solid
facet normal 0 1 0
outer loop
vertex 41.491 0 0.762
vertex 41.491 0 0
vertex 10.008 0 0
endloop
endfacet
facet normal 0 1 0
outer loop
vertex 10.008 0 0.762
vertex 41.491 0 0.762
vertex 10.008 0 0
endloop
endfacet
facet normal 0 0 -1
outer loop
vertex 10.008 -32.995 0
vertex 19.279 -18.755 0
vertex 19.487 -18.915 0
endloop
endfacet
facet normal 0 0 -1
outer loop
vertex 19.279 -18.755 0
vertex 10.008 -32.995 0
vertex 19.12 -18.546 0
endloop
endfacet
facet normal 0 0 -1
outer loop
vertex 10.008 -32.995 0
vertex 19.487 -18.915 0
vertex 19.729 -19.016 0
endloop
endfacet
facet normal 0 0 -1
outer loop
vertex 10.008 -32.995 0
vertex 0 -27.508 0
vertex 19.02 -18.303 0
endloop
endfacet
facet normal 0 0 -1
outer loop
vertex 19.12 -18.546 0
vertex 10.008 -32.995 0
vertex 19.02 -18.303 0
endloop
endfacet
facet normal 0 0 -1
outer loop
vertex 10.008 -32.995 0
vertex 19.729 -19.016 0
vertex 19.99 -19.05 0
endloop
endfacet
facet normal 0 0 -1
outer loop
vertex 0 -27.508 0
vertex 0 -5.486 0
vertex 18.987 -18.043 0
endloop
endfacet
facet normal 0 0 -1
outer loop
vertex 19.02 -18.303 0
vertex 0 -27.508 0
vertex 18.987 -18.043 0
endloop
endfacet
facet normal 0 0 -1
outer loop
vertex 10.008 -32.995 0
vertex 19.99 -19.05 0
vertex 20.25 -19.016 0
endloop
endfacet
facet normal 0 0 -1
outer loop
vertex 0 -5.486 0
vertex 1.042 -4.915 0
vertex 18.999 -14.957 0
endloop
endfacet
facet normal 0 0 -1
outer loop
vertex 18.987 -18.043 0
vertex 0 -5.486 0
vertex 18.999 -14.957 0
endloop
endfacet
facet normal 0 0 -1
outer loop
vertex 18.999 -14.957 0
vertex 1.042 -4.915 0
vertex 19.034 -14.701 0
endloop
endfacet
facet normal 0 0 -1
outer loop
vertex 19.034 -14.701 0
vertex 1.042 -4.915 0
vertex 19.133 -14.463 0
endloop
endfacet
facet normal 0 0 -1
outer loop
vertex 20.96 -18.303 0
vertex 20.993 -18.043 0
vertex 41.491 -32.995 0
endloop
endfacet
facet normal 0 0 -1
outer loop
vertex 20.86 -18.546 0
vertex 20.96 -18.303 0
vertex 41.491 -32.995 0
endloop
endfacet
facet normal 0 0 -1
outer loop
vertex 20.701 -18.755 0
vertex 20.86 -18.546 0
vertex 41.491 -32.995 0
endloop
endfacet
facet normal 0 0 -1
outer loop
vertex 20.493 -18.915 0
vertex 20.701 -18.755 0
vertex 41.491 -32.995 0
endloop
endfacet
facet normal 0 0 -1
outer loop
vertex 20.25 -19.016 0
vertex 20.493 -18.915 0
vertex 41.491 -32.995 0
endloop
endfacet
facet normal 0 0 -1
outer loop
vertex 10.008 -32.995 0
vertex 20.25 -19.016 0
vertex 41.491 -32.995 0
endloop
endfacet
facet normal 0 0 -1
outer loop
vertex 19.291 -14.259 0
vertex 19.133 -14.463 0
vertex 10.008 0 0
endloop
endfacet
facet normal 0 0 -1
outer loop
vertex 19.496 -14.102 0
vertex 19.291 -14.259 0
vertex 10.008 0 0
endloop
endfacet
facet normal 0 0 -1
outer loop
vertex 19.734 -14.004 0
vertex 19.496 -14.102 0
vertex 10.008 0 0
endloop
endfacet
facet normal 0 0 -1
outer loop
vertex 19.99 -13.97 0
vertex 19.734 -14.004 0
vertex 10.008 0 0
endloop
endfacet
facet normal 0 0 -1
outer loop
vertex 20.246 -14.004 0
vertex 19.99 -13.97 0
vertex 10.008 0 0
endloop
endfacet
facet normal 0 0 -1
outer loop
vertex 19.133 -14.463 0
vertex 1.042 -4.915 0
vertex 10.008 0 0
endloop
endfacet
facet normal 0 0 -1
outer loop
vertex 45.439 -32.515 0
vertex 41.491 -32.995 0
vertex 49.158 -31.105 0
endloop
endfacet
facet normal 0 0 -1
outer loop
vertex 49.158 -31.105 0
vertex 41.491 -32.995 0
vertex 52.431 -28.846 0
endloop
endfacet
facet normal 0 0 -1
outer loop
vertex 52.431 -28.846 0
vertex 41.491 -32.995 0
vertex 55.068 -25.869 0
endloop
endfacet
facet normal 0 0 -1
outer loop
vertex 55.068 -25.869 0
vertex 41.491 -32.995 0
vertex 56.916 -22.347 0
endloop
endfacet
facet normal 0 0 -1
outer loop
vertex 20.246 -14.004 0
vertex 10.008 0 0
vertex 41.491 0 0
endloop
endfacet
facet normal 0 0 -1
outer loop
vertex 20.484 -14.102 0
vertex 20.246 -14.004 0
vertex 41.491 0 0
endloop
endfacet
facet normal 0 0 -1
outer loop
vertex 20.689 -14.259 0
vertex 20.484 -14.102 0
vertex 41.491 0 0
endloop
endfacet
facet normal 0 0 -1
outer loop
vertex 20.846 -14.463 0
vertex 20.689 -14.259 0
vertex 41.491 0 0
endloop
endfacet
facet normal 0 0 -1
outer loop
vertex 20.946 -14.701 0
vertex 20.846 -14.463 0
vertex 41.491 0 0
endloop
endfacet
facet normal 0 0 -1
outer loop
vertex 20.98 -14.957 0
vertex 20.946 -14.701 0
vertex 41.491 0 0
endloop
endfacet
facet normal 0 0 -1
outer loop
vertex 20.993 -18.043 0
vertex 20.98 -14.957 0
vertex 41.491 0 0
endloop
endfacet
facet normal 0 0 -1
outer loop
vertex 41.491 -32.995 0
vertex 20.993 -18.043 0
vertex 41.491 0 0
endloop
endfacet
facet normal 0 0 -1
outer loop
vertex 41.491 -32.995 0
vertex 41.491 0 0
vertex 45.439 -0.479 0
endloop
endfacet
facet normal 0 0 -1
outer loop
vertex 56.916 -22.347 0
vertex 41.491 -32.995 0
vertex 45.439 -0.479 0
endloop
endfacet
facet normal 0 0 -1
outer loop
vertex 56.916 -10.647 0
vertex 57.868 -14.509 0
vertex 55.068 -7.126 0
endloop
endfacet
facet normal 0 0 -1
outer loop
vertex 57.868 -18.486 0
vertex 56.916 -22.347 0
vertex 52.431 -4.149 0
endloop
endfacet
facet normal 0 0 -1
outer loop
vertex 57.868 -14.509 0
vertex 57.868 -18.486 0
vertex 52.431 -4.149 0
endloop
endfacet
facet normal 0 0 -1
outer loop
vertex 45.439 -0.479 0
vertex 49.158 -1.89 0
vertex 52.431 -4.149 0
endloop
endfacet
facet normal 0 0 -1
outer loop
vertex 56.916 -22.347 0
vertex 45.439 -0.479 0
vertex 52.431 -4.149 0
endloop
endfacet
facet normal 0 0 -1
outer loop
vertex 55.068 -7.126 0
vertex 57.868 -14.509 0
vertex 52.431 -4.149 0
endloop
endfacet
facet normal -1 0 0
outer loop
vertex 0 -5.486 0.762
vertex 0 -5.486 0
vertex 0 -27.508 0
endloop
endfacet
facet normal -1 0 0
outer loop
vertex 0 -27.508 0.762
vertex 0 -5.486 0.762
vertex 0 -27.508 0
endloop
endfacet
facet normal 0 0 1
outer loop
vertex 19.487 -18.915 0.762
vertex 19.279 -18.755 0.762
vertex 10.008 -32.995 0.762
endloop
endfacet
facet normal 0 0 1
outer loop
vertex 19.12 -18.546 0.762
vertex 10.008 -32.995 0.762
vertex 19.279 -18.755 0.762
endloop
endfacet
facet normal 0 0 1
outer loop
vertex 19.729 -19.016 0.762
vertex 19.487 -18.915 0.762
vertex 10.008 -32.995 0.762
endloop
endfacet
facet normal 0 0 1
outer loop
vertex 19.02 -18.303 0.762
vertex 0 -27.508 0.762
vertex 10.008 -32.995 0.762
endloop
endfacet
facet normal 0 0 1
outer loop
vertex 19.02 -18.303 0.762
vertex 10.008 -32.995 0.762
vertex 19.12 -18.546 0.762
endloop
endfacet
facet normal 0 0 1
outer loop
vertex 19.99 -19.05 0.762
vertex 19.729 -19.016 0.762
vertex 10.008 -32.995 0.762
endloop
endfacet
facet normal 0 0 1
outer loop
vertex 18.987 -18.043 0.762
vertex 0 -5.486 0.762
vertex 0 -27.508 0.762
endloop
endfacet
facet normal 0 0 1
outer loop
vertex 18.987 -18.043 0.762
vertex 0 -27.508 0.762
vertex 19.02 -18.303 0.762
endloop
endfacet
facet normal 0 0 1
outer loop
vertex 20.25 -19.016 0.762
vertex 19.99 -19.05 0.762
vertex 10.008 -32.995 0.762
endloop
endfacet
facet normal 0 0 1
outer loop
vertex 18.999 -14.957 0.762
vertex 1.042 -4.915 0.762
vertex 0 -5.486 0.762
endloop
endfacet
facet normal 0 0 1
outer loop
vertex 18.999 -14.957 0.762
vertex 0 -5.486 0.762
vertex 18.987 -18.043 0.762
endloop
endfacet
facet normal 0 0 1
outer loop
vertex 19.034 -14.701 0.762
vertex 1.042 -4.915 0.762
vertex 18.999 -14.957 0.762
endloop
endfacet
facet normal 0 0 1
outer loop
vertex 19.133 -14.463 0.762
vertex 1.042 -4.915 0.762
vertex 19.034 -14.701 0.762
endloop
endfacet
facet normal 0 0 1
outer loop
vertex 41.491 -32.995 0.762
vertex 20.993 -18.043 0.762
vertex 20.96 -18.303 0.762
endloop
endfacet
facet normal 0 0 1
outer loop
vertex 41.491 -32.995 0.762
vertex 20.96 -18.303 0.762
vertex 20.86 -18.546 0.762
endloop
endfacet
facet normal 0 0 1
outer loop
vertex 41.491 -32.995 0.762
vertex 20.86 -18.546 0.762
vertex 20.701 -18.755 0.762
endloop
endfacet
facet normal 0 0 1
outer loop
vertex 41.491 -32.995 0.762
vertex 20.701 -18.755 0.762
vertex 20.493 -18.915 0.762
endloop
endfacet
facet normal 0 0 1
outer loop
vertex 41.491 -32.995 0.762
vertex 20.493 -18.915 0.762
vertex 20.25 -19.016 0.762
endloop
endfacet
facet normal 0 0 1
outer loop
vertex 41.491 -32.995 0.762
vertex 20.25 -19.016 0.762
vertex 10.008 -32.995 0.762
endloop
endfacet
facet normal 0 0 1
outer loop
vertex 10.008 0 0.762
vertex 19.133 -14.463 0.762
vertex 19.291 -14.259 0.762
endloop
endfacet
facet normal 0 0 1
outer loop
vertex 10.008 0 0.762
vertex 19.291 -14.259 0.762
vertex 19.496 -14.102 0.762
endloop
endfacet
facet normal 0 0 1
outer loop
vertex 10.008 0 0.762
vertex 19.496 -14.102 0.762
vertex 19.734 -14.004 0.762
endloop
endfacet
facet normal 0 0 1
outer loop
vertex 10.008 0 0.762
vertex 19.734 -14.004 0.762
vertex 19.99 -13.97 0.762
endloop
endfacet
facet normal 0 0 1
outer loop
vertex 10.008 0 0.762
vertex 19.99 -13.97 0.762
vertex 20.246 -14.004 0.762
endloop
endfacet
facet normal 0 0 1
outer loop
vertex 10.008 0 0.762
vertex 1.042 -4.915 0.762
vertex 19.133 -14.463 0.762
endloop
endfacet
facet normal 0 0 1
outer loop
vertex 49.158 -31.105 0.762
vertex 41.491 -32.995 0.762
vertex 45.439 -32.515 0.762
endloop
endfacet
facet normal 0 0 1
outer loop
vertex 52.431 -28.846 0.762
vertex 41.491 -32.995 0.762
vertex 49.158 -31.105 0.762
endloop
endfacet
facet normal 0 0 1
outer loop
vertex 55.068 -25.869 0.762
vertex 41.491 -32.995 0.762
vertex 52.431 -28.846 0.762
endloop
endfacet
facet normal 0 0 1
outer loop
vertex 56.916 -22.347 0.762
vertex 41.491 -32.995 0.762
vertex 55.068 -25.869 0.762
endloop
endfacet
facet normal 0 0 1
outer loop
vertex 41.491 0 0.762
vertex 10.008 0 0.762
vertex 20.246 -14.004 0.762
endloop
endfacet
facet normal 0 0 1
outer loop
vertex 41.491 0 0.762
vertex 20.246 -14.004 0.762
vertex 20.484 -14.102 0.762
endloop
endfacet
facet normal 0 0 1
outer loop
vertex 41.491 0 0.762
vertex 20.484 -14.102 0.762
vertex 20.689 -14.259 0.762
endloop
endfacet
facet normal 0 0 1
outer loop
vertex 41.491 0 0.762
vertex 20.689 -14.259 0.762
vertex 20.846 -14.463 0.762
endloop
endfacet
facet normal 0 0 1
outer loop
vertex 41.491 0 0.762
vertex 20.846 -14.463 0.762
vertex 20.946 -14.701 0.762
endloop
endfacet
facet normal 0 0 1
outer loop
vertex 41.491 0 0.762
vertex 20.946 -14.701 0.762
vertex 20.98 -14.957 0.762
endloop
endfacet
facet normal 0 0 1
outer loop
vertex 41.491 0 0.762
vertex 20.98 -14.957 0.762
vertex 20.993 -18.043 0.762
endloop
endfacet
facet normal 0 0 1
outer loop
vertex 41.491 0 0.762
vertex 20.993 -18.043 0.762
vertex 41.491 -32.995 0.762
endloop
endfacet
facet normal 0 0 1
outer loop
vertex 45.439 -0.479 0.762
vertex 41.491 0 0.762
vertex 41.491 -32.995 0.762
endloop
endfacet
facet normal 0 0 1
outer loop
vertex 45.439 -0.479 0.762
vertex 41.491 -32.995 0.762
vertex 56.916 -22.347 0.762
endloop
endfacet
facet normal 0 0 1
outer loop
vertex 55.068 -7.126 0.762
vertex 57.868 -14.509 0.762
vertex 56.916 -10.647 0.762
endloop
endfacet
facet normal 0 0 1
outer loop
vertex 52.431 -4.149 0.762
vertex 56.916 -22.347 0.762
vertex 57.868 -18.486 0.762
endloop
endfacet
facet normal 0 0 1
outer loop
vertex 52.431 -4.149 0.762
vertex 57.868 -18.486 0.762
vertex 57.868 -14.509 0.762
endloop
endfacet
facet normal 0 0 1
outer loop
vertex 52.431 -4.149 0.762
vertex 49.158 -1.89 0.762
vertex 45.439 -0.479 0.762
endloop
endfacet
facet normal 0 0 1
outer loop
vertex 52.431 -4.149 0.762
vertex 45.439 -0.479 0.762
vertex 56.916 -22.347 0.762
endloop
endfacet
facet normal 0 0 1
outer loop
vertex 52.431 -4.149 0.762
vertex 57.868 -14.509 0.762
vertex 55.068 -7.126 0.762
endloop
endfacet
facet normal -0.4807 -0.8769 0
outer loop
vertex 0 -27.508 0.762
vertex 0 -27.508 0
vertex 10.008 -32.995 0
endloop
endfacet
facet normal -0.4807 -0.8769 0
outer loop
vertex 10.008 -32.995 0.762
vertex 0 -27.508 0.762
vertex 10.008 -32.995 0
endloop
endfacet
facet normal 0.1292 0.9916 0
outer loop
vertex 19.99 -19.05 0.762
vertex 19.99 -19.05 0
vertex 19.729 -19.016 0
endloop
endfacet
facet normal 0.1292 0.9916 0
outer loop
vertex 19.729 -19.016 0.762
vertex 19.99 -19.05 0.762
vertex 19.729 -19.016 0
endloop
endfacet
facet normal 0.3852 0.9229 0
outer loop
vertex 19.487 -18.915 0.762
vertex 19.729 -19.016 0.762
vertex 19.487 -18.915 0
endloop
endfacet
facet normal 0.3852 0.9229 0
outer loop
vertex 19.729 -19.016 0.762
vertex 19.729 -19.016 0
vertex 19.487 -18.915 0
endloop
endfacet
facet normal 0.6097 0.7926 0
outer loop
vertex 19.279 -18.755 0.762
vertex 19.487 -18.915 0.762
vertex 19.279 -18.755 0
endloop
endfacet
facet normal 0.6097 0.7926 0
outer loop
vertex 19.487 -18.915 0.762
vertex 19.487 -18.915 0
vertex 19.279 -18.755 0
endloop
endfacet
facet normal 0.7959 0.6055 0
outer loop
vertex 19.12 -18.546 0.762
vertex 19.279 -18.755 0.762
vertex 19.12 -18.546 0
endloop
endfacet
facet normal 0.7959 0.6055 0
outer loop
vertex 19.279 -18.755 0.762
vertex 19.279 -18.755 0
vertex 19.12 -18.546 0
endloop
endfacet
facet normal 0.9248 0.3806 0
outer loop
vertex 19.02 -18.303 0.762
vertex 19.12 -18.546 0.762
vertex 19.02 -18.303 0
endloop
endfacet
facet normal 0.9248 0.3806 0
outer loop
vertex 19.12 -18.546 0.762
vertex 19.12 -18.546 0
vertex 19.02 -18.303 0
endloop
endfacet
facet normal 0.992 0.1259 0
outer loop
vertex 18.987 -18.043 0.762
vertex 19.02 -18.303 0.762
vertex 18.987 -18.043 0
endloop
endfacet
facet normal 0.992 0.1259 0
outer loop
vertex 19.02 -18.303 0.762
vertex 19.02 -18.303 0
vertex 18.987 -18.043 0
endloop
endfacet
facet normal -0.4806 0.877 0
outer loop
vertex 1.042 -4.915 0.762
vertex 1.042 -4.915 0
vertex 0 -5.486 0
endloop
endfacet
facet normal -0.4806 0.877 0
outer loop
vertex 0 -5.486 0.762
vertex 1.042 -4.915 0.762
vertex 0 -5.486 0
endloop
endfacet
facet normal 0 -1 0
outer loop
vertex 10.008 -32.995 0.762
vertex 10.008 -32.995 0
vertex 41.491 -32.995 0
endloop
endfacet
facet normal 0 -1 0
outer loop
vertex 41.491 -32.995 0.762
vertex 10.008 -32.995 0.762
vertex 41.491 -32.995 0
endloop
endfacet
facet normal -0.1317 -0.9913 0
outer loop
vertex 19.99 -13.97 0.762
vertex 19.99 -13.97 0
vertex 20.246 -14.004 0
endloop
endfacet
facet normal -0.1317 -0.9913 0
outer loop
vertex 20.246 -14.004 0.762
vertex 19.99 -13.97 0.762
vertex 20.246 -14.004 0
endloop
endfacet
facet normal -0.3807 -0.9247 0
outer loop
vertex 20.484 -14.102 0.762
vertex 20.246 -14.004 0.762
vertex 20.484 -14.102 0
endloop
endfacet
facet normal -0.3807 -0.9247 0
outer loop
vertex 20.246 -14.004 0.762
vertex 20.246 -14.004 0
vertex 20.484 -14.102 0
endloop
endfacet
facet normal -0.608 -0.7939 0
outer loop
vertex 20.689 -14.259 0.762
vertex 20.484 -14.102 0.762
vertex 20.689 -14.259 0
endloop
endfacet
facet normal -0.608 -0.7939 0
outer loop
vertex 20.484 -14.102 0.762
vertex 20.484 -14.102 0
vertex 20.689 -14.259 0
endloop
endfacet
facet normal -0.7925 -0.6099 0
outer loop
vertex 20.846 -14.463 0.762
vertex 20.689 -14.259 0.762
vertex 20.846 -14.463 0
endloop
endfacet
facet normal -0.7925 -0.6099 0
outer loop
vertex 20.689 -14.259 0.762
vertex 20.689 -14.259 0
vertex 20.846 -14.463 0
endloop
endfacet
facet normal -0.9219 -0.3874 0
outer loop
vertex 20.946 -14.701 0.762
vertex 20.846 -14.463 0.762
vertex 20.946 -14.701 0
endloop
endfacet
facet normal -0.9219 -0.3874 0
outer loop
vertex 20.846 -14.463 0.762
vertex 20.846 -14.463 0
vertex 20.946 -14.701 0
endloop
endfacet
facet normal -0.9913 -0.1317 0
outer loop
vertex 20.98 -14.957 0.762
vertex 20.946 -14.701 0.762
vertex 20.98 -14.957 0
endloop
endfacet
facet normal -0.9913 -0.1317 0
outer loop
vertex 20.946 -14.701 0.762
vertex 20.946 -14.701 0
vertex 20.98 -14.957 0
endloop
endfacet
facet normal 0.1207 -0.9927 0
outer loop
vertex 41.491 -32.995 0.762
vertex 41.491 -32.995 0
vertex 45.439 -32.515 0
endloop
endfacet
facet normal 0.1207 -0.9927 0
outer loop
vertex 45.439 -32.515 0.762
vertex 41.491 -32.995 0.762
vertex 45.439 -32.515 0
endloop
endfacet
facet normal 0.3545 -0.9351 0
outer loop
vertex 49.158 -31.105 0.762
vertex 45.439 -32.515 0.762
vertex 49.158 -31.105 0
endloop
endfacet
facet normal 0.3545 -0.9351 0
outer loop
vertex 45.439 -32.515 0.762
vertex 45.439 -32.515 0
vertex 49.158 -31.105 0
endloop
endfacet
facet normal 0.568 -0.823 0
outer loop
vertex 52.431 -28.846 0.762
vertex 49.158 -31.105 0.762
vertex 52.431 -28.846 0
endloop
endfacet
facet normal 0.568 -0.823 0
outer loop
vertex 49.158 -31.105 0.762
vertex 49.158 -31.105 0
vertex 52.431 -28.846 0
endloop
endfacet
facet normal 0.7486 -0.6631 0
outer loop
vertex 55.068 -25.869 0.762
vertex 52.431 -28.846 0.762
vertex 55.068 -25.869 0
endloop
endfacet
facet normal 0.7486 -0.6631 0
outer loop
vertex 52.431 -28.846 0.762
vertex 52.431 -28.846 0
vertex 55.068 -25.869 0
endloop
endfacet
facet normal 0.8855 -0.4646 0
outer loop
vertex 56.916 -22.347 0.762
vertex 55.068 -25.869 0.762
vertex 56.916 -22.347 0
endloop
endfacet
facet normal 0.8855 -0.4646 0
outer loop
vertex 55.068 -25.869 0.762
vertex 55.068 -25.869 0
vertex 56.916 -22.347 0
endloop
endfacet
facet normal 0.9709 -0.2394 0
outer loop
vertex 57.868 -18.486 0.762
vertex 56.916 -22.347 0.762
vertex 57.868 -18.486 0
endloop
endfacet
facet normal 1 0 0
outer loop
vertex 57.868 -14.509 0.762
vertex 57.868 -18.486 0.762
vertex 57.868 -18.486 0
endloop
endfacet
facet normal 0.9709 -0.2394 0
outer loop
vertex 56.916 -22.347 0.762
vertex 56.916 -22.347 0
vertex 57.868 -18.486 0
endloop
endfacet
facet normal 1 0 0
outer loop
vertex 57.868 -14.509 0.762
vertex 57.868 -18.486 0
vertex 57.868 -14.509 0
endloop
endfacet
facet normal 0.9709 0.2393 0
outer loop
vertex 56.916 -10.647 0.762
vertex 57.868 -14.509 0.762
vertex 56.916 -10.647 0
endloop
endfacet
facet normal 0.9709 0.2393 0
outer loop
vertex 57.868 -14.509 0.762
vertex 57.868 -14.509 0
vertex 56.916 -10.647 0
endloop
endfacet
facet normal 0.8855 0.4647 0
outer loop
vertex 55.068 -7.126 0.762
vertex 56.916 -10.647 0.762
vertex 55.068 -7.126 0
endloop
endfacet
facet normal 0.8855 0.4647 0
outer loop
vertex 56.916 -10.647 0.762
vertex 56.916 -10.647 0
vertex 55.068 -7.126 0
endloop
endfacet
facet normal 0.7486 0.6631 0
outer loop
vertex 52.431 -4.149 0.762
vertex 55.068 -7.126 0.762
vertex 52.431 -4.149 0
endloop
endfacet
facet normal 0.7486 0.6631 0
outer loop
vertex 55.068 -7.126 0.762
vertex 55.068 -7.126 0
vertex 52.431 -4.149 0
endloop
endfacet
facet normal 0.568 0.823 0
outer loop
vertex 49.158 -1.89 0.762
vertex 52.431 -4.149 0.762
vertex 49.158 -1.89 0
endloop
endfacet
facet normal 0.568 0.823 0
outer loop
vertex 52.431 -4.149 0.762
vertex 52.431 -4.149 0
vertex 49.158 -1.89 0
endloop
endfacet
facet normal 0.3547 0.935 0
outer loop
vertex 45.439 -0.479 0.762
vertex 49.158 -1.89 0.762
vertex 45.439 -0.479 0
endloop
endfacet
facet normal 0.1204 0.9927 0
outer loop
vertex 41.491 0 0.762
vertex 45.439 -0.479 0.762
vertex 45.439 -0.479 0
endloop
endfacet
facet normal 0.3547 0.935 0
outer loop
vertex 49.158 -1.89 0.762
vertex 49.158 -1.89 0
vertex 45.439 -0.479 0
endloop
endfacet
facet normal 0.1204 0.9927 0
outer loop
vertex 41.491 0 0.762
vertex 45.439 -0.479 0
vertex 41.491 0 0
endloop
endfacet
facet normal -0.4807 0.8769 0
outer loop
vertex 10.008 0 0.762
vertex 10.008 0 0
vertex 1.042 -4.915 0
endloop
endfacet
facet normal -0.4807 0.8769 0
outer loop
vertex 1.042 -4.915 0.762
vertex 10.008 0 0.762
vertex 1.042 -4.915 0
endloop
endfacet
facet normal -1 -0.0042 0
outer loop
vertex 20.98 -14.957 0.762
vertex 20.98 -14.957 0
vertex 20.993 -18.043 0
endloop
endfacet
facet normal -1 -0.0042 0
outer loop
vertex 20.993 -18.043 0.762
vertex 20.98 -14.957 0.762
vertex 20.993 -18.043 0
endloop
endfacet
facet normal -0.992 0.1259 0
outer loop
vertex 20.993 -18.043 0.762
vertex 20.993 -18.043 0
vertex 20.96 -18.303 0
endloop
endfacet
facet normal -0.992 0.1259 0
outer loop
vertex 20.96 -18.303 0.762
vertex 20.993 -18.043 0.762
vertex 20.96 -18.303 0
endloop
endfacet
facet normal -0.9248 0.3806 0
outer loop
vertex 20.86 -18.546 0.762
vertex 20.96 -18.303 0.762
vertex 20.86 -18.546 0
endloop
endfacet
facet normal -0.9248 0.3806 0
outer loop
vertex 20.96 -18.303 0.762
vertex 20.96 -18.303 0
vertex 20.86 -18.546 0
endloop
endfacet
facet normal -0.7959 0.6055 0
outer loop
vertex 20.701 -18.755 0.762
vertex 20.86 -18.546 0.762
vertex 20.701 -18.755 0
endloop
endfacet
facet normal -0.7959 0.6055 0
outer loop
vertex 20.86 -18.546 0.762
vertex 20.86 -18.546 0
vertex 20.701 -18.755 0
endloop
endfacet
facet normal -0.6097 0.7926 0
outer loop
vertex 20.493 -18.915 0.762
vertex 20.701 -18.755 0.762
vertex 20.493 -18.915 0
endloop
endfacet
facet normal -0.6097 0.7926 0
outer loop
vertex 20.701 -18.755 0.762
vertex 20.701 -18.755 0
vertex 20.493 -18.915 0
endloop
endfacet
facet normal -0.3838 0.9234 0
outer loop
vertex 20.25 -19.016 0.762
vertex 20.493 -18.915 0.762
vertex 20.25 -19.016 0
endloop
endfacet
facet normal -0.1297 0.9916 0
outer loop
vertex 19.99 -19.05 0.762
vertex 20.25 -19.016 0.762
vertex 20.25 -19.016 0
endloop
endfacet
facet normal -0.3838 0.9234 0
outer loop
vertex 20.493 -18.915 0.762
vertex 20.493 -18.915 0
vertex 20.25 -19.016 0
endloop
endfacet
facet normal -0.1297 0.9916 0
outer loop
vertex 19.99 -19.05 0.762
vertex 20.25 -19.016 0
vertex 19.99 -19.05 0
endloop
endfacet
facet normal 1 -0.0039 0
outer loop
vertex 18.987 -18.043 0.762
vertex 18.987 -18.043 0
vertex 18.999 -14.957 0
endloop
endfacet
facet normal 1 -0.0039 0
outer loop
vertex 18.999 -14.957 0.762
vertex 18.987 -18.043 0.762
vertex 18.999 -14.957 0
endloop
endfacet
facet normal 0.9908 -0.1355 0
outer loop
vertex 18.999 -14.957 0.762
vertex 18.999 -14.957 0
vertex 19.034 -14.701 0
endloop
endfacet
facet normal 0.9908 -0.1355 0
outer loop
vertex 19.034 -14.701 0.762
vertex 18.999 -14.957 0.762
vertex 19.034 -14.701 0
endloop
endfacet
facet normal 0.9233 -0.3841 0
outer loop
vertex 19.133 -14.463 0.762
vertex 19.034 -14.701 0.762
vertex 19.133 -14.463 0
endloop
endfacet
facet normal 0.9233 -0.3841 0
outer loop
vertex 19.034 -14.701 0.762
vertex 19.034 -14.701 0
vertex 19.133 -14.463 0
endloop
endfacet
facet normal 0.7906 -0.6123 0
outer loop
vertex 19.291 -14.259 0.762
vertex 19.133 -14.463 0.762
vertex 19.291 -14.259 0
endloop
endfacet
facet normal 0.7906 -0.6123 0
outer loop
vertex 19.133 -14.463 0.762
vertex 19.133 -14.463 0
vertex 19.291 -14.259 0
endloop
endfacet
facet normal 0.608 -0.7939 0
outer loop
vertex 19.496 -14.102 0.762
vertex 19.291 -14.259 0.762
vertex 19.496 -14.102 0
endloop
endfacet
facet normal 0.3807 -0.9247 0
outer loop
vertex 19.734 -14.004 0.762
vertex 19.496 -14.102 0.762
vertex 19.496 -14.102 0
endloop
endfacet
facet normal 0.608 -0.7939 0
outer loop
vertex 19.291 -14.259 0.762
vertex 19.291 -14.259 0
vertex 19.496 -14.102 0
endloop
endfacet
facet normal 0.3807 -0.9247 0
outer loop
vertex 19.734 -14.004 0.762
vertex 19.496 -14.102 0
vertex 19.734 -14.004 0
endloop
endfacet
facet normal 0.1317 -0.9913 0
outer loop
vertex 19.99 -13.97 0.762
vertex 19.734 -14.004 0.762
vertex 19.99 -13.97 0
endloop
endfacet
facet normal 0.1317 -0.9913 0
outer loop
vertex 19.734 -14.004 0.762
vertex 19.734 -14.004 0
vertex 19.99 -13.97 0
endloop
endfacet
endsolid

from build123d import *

# Parameters (mm, degrees)
F1_DEPTH = 0.762


with BuildPart() as f1:
    # F0 (on Top) → F1 (new body)
    with BuildSketch(Plane.XY):
        with BuildLine():
            Line((41.4909, 0), (10.0076, 0))
            Line((10.0076, 0), (1.041983, -4.915161))
            Line((1.041983, -4.915161), (0, -5.4864))
            Line((0, -5.4864), (0, -6.674694))
            Line((0, -6.674694), (0, -27.5082))
            Line((0, -27.5082), (10.0076, -32.9946))
            Line((10.0076, -32.9946), (41.4909, -32.9946))
            ThreePointArc((41.4909, -32.9946), (57.9882, -16.4973), (41.4909, 0))
        make_face()
        with BuildLine():
            Line((18.986508, -18.042571), (18.999208, -14.956523))
            ThreePointArc((18.999208, -14.956523), (19.290783, -14.2587), (19.9898, -13.97))
            ThreePointArc((19.9898, -13.97), (20.688817, -14.2587), (20.980392, -14.956523))
            Line((20.980392, -14.956523), (20.993092, -18.042571))
            ThreePointArc((20.993092, -18.042571), (20.700698, -18.754679), (19.9898, -19.05))
            ThreePointArc((19.9898, -19.05), (19.278902, -18.754679), (18.986508, -18.042571))
        make_face(mode=Mode.SUBTRACT)
    extrude(amount=F1_DEPTH)


solid = f1.part
